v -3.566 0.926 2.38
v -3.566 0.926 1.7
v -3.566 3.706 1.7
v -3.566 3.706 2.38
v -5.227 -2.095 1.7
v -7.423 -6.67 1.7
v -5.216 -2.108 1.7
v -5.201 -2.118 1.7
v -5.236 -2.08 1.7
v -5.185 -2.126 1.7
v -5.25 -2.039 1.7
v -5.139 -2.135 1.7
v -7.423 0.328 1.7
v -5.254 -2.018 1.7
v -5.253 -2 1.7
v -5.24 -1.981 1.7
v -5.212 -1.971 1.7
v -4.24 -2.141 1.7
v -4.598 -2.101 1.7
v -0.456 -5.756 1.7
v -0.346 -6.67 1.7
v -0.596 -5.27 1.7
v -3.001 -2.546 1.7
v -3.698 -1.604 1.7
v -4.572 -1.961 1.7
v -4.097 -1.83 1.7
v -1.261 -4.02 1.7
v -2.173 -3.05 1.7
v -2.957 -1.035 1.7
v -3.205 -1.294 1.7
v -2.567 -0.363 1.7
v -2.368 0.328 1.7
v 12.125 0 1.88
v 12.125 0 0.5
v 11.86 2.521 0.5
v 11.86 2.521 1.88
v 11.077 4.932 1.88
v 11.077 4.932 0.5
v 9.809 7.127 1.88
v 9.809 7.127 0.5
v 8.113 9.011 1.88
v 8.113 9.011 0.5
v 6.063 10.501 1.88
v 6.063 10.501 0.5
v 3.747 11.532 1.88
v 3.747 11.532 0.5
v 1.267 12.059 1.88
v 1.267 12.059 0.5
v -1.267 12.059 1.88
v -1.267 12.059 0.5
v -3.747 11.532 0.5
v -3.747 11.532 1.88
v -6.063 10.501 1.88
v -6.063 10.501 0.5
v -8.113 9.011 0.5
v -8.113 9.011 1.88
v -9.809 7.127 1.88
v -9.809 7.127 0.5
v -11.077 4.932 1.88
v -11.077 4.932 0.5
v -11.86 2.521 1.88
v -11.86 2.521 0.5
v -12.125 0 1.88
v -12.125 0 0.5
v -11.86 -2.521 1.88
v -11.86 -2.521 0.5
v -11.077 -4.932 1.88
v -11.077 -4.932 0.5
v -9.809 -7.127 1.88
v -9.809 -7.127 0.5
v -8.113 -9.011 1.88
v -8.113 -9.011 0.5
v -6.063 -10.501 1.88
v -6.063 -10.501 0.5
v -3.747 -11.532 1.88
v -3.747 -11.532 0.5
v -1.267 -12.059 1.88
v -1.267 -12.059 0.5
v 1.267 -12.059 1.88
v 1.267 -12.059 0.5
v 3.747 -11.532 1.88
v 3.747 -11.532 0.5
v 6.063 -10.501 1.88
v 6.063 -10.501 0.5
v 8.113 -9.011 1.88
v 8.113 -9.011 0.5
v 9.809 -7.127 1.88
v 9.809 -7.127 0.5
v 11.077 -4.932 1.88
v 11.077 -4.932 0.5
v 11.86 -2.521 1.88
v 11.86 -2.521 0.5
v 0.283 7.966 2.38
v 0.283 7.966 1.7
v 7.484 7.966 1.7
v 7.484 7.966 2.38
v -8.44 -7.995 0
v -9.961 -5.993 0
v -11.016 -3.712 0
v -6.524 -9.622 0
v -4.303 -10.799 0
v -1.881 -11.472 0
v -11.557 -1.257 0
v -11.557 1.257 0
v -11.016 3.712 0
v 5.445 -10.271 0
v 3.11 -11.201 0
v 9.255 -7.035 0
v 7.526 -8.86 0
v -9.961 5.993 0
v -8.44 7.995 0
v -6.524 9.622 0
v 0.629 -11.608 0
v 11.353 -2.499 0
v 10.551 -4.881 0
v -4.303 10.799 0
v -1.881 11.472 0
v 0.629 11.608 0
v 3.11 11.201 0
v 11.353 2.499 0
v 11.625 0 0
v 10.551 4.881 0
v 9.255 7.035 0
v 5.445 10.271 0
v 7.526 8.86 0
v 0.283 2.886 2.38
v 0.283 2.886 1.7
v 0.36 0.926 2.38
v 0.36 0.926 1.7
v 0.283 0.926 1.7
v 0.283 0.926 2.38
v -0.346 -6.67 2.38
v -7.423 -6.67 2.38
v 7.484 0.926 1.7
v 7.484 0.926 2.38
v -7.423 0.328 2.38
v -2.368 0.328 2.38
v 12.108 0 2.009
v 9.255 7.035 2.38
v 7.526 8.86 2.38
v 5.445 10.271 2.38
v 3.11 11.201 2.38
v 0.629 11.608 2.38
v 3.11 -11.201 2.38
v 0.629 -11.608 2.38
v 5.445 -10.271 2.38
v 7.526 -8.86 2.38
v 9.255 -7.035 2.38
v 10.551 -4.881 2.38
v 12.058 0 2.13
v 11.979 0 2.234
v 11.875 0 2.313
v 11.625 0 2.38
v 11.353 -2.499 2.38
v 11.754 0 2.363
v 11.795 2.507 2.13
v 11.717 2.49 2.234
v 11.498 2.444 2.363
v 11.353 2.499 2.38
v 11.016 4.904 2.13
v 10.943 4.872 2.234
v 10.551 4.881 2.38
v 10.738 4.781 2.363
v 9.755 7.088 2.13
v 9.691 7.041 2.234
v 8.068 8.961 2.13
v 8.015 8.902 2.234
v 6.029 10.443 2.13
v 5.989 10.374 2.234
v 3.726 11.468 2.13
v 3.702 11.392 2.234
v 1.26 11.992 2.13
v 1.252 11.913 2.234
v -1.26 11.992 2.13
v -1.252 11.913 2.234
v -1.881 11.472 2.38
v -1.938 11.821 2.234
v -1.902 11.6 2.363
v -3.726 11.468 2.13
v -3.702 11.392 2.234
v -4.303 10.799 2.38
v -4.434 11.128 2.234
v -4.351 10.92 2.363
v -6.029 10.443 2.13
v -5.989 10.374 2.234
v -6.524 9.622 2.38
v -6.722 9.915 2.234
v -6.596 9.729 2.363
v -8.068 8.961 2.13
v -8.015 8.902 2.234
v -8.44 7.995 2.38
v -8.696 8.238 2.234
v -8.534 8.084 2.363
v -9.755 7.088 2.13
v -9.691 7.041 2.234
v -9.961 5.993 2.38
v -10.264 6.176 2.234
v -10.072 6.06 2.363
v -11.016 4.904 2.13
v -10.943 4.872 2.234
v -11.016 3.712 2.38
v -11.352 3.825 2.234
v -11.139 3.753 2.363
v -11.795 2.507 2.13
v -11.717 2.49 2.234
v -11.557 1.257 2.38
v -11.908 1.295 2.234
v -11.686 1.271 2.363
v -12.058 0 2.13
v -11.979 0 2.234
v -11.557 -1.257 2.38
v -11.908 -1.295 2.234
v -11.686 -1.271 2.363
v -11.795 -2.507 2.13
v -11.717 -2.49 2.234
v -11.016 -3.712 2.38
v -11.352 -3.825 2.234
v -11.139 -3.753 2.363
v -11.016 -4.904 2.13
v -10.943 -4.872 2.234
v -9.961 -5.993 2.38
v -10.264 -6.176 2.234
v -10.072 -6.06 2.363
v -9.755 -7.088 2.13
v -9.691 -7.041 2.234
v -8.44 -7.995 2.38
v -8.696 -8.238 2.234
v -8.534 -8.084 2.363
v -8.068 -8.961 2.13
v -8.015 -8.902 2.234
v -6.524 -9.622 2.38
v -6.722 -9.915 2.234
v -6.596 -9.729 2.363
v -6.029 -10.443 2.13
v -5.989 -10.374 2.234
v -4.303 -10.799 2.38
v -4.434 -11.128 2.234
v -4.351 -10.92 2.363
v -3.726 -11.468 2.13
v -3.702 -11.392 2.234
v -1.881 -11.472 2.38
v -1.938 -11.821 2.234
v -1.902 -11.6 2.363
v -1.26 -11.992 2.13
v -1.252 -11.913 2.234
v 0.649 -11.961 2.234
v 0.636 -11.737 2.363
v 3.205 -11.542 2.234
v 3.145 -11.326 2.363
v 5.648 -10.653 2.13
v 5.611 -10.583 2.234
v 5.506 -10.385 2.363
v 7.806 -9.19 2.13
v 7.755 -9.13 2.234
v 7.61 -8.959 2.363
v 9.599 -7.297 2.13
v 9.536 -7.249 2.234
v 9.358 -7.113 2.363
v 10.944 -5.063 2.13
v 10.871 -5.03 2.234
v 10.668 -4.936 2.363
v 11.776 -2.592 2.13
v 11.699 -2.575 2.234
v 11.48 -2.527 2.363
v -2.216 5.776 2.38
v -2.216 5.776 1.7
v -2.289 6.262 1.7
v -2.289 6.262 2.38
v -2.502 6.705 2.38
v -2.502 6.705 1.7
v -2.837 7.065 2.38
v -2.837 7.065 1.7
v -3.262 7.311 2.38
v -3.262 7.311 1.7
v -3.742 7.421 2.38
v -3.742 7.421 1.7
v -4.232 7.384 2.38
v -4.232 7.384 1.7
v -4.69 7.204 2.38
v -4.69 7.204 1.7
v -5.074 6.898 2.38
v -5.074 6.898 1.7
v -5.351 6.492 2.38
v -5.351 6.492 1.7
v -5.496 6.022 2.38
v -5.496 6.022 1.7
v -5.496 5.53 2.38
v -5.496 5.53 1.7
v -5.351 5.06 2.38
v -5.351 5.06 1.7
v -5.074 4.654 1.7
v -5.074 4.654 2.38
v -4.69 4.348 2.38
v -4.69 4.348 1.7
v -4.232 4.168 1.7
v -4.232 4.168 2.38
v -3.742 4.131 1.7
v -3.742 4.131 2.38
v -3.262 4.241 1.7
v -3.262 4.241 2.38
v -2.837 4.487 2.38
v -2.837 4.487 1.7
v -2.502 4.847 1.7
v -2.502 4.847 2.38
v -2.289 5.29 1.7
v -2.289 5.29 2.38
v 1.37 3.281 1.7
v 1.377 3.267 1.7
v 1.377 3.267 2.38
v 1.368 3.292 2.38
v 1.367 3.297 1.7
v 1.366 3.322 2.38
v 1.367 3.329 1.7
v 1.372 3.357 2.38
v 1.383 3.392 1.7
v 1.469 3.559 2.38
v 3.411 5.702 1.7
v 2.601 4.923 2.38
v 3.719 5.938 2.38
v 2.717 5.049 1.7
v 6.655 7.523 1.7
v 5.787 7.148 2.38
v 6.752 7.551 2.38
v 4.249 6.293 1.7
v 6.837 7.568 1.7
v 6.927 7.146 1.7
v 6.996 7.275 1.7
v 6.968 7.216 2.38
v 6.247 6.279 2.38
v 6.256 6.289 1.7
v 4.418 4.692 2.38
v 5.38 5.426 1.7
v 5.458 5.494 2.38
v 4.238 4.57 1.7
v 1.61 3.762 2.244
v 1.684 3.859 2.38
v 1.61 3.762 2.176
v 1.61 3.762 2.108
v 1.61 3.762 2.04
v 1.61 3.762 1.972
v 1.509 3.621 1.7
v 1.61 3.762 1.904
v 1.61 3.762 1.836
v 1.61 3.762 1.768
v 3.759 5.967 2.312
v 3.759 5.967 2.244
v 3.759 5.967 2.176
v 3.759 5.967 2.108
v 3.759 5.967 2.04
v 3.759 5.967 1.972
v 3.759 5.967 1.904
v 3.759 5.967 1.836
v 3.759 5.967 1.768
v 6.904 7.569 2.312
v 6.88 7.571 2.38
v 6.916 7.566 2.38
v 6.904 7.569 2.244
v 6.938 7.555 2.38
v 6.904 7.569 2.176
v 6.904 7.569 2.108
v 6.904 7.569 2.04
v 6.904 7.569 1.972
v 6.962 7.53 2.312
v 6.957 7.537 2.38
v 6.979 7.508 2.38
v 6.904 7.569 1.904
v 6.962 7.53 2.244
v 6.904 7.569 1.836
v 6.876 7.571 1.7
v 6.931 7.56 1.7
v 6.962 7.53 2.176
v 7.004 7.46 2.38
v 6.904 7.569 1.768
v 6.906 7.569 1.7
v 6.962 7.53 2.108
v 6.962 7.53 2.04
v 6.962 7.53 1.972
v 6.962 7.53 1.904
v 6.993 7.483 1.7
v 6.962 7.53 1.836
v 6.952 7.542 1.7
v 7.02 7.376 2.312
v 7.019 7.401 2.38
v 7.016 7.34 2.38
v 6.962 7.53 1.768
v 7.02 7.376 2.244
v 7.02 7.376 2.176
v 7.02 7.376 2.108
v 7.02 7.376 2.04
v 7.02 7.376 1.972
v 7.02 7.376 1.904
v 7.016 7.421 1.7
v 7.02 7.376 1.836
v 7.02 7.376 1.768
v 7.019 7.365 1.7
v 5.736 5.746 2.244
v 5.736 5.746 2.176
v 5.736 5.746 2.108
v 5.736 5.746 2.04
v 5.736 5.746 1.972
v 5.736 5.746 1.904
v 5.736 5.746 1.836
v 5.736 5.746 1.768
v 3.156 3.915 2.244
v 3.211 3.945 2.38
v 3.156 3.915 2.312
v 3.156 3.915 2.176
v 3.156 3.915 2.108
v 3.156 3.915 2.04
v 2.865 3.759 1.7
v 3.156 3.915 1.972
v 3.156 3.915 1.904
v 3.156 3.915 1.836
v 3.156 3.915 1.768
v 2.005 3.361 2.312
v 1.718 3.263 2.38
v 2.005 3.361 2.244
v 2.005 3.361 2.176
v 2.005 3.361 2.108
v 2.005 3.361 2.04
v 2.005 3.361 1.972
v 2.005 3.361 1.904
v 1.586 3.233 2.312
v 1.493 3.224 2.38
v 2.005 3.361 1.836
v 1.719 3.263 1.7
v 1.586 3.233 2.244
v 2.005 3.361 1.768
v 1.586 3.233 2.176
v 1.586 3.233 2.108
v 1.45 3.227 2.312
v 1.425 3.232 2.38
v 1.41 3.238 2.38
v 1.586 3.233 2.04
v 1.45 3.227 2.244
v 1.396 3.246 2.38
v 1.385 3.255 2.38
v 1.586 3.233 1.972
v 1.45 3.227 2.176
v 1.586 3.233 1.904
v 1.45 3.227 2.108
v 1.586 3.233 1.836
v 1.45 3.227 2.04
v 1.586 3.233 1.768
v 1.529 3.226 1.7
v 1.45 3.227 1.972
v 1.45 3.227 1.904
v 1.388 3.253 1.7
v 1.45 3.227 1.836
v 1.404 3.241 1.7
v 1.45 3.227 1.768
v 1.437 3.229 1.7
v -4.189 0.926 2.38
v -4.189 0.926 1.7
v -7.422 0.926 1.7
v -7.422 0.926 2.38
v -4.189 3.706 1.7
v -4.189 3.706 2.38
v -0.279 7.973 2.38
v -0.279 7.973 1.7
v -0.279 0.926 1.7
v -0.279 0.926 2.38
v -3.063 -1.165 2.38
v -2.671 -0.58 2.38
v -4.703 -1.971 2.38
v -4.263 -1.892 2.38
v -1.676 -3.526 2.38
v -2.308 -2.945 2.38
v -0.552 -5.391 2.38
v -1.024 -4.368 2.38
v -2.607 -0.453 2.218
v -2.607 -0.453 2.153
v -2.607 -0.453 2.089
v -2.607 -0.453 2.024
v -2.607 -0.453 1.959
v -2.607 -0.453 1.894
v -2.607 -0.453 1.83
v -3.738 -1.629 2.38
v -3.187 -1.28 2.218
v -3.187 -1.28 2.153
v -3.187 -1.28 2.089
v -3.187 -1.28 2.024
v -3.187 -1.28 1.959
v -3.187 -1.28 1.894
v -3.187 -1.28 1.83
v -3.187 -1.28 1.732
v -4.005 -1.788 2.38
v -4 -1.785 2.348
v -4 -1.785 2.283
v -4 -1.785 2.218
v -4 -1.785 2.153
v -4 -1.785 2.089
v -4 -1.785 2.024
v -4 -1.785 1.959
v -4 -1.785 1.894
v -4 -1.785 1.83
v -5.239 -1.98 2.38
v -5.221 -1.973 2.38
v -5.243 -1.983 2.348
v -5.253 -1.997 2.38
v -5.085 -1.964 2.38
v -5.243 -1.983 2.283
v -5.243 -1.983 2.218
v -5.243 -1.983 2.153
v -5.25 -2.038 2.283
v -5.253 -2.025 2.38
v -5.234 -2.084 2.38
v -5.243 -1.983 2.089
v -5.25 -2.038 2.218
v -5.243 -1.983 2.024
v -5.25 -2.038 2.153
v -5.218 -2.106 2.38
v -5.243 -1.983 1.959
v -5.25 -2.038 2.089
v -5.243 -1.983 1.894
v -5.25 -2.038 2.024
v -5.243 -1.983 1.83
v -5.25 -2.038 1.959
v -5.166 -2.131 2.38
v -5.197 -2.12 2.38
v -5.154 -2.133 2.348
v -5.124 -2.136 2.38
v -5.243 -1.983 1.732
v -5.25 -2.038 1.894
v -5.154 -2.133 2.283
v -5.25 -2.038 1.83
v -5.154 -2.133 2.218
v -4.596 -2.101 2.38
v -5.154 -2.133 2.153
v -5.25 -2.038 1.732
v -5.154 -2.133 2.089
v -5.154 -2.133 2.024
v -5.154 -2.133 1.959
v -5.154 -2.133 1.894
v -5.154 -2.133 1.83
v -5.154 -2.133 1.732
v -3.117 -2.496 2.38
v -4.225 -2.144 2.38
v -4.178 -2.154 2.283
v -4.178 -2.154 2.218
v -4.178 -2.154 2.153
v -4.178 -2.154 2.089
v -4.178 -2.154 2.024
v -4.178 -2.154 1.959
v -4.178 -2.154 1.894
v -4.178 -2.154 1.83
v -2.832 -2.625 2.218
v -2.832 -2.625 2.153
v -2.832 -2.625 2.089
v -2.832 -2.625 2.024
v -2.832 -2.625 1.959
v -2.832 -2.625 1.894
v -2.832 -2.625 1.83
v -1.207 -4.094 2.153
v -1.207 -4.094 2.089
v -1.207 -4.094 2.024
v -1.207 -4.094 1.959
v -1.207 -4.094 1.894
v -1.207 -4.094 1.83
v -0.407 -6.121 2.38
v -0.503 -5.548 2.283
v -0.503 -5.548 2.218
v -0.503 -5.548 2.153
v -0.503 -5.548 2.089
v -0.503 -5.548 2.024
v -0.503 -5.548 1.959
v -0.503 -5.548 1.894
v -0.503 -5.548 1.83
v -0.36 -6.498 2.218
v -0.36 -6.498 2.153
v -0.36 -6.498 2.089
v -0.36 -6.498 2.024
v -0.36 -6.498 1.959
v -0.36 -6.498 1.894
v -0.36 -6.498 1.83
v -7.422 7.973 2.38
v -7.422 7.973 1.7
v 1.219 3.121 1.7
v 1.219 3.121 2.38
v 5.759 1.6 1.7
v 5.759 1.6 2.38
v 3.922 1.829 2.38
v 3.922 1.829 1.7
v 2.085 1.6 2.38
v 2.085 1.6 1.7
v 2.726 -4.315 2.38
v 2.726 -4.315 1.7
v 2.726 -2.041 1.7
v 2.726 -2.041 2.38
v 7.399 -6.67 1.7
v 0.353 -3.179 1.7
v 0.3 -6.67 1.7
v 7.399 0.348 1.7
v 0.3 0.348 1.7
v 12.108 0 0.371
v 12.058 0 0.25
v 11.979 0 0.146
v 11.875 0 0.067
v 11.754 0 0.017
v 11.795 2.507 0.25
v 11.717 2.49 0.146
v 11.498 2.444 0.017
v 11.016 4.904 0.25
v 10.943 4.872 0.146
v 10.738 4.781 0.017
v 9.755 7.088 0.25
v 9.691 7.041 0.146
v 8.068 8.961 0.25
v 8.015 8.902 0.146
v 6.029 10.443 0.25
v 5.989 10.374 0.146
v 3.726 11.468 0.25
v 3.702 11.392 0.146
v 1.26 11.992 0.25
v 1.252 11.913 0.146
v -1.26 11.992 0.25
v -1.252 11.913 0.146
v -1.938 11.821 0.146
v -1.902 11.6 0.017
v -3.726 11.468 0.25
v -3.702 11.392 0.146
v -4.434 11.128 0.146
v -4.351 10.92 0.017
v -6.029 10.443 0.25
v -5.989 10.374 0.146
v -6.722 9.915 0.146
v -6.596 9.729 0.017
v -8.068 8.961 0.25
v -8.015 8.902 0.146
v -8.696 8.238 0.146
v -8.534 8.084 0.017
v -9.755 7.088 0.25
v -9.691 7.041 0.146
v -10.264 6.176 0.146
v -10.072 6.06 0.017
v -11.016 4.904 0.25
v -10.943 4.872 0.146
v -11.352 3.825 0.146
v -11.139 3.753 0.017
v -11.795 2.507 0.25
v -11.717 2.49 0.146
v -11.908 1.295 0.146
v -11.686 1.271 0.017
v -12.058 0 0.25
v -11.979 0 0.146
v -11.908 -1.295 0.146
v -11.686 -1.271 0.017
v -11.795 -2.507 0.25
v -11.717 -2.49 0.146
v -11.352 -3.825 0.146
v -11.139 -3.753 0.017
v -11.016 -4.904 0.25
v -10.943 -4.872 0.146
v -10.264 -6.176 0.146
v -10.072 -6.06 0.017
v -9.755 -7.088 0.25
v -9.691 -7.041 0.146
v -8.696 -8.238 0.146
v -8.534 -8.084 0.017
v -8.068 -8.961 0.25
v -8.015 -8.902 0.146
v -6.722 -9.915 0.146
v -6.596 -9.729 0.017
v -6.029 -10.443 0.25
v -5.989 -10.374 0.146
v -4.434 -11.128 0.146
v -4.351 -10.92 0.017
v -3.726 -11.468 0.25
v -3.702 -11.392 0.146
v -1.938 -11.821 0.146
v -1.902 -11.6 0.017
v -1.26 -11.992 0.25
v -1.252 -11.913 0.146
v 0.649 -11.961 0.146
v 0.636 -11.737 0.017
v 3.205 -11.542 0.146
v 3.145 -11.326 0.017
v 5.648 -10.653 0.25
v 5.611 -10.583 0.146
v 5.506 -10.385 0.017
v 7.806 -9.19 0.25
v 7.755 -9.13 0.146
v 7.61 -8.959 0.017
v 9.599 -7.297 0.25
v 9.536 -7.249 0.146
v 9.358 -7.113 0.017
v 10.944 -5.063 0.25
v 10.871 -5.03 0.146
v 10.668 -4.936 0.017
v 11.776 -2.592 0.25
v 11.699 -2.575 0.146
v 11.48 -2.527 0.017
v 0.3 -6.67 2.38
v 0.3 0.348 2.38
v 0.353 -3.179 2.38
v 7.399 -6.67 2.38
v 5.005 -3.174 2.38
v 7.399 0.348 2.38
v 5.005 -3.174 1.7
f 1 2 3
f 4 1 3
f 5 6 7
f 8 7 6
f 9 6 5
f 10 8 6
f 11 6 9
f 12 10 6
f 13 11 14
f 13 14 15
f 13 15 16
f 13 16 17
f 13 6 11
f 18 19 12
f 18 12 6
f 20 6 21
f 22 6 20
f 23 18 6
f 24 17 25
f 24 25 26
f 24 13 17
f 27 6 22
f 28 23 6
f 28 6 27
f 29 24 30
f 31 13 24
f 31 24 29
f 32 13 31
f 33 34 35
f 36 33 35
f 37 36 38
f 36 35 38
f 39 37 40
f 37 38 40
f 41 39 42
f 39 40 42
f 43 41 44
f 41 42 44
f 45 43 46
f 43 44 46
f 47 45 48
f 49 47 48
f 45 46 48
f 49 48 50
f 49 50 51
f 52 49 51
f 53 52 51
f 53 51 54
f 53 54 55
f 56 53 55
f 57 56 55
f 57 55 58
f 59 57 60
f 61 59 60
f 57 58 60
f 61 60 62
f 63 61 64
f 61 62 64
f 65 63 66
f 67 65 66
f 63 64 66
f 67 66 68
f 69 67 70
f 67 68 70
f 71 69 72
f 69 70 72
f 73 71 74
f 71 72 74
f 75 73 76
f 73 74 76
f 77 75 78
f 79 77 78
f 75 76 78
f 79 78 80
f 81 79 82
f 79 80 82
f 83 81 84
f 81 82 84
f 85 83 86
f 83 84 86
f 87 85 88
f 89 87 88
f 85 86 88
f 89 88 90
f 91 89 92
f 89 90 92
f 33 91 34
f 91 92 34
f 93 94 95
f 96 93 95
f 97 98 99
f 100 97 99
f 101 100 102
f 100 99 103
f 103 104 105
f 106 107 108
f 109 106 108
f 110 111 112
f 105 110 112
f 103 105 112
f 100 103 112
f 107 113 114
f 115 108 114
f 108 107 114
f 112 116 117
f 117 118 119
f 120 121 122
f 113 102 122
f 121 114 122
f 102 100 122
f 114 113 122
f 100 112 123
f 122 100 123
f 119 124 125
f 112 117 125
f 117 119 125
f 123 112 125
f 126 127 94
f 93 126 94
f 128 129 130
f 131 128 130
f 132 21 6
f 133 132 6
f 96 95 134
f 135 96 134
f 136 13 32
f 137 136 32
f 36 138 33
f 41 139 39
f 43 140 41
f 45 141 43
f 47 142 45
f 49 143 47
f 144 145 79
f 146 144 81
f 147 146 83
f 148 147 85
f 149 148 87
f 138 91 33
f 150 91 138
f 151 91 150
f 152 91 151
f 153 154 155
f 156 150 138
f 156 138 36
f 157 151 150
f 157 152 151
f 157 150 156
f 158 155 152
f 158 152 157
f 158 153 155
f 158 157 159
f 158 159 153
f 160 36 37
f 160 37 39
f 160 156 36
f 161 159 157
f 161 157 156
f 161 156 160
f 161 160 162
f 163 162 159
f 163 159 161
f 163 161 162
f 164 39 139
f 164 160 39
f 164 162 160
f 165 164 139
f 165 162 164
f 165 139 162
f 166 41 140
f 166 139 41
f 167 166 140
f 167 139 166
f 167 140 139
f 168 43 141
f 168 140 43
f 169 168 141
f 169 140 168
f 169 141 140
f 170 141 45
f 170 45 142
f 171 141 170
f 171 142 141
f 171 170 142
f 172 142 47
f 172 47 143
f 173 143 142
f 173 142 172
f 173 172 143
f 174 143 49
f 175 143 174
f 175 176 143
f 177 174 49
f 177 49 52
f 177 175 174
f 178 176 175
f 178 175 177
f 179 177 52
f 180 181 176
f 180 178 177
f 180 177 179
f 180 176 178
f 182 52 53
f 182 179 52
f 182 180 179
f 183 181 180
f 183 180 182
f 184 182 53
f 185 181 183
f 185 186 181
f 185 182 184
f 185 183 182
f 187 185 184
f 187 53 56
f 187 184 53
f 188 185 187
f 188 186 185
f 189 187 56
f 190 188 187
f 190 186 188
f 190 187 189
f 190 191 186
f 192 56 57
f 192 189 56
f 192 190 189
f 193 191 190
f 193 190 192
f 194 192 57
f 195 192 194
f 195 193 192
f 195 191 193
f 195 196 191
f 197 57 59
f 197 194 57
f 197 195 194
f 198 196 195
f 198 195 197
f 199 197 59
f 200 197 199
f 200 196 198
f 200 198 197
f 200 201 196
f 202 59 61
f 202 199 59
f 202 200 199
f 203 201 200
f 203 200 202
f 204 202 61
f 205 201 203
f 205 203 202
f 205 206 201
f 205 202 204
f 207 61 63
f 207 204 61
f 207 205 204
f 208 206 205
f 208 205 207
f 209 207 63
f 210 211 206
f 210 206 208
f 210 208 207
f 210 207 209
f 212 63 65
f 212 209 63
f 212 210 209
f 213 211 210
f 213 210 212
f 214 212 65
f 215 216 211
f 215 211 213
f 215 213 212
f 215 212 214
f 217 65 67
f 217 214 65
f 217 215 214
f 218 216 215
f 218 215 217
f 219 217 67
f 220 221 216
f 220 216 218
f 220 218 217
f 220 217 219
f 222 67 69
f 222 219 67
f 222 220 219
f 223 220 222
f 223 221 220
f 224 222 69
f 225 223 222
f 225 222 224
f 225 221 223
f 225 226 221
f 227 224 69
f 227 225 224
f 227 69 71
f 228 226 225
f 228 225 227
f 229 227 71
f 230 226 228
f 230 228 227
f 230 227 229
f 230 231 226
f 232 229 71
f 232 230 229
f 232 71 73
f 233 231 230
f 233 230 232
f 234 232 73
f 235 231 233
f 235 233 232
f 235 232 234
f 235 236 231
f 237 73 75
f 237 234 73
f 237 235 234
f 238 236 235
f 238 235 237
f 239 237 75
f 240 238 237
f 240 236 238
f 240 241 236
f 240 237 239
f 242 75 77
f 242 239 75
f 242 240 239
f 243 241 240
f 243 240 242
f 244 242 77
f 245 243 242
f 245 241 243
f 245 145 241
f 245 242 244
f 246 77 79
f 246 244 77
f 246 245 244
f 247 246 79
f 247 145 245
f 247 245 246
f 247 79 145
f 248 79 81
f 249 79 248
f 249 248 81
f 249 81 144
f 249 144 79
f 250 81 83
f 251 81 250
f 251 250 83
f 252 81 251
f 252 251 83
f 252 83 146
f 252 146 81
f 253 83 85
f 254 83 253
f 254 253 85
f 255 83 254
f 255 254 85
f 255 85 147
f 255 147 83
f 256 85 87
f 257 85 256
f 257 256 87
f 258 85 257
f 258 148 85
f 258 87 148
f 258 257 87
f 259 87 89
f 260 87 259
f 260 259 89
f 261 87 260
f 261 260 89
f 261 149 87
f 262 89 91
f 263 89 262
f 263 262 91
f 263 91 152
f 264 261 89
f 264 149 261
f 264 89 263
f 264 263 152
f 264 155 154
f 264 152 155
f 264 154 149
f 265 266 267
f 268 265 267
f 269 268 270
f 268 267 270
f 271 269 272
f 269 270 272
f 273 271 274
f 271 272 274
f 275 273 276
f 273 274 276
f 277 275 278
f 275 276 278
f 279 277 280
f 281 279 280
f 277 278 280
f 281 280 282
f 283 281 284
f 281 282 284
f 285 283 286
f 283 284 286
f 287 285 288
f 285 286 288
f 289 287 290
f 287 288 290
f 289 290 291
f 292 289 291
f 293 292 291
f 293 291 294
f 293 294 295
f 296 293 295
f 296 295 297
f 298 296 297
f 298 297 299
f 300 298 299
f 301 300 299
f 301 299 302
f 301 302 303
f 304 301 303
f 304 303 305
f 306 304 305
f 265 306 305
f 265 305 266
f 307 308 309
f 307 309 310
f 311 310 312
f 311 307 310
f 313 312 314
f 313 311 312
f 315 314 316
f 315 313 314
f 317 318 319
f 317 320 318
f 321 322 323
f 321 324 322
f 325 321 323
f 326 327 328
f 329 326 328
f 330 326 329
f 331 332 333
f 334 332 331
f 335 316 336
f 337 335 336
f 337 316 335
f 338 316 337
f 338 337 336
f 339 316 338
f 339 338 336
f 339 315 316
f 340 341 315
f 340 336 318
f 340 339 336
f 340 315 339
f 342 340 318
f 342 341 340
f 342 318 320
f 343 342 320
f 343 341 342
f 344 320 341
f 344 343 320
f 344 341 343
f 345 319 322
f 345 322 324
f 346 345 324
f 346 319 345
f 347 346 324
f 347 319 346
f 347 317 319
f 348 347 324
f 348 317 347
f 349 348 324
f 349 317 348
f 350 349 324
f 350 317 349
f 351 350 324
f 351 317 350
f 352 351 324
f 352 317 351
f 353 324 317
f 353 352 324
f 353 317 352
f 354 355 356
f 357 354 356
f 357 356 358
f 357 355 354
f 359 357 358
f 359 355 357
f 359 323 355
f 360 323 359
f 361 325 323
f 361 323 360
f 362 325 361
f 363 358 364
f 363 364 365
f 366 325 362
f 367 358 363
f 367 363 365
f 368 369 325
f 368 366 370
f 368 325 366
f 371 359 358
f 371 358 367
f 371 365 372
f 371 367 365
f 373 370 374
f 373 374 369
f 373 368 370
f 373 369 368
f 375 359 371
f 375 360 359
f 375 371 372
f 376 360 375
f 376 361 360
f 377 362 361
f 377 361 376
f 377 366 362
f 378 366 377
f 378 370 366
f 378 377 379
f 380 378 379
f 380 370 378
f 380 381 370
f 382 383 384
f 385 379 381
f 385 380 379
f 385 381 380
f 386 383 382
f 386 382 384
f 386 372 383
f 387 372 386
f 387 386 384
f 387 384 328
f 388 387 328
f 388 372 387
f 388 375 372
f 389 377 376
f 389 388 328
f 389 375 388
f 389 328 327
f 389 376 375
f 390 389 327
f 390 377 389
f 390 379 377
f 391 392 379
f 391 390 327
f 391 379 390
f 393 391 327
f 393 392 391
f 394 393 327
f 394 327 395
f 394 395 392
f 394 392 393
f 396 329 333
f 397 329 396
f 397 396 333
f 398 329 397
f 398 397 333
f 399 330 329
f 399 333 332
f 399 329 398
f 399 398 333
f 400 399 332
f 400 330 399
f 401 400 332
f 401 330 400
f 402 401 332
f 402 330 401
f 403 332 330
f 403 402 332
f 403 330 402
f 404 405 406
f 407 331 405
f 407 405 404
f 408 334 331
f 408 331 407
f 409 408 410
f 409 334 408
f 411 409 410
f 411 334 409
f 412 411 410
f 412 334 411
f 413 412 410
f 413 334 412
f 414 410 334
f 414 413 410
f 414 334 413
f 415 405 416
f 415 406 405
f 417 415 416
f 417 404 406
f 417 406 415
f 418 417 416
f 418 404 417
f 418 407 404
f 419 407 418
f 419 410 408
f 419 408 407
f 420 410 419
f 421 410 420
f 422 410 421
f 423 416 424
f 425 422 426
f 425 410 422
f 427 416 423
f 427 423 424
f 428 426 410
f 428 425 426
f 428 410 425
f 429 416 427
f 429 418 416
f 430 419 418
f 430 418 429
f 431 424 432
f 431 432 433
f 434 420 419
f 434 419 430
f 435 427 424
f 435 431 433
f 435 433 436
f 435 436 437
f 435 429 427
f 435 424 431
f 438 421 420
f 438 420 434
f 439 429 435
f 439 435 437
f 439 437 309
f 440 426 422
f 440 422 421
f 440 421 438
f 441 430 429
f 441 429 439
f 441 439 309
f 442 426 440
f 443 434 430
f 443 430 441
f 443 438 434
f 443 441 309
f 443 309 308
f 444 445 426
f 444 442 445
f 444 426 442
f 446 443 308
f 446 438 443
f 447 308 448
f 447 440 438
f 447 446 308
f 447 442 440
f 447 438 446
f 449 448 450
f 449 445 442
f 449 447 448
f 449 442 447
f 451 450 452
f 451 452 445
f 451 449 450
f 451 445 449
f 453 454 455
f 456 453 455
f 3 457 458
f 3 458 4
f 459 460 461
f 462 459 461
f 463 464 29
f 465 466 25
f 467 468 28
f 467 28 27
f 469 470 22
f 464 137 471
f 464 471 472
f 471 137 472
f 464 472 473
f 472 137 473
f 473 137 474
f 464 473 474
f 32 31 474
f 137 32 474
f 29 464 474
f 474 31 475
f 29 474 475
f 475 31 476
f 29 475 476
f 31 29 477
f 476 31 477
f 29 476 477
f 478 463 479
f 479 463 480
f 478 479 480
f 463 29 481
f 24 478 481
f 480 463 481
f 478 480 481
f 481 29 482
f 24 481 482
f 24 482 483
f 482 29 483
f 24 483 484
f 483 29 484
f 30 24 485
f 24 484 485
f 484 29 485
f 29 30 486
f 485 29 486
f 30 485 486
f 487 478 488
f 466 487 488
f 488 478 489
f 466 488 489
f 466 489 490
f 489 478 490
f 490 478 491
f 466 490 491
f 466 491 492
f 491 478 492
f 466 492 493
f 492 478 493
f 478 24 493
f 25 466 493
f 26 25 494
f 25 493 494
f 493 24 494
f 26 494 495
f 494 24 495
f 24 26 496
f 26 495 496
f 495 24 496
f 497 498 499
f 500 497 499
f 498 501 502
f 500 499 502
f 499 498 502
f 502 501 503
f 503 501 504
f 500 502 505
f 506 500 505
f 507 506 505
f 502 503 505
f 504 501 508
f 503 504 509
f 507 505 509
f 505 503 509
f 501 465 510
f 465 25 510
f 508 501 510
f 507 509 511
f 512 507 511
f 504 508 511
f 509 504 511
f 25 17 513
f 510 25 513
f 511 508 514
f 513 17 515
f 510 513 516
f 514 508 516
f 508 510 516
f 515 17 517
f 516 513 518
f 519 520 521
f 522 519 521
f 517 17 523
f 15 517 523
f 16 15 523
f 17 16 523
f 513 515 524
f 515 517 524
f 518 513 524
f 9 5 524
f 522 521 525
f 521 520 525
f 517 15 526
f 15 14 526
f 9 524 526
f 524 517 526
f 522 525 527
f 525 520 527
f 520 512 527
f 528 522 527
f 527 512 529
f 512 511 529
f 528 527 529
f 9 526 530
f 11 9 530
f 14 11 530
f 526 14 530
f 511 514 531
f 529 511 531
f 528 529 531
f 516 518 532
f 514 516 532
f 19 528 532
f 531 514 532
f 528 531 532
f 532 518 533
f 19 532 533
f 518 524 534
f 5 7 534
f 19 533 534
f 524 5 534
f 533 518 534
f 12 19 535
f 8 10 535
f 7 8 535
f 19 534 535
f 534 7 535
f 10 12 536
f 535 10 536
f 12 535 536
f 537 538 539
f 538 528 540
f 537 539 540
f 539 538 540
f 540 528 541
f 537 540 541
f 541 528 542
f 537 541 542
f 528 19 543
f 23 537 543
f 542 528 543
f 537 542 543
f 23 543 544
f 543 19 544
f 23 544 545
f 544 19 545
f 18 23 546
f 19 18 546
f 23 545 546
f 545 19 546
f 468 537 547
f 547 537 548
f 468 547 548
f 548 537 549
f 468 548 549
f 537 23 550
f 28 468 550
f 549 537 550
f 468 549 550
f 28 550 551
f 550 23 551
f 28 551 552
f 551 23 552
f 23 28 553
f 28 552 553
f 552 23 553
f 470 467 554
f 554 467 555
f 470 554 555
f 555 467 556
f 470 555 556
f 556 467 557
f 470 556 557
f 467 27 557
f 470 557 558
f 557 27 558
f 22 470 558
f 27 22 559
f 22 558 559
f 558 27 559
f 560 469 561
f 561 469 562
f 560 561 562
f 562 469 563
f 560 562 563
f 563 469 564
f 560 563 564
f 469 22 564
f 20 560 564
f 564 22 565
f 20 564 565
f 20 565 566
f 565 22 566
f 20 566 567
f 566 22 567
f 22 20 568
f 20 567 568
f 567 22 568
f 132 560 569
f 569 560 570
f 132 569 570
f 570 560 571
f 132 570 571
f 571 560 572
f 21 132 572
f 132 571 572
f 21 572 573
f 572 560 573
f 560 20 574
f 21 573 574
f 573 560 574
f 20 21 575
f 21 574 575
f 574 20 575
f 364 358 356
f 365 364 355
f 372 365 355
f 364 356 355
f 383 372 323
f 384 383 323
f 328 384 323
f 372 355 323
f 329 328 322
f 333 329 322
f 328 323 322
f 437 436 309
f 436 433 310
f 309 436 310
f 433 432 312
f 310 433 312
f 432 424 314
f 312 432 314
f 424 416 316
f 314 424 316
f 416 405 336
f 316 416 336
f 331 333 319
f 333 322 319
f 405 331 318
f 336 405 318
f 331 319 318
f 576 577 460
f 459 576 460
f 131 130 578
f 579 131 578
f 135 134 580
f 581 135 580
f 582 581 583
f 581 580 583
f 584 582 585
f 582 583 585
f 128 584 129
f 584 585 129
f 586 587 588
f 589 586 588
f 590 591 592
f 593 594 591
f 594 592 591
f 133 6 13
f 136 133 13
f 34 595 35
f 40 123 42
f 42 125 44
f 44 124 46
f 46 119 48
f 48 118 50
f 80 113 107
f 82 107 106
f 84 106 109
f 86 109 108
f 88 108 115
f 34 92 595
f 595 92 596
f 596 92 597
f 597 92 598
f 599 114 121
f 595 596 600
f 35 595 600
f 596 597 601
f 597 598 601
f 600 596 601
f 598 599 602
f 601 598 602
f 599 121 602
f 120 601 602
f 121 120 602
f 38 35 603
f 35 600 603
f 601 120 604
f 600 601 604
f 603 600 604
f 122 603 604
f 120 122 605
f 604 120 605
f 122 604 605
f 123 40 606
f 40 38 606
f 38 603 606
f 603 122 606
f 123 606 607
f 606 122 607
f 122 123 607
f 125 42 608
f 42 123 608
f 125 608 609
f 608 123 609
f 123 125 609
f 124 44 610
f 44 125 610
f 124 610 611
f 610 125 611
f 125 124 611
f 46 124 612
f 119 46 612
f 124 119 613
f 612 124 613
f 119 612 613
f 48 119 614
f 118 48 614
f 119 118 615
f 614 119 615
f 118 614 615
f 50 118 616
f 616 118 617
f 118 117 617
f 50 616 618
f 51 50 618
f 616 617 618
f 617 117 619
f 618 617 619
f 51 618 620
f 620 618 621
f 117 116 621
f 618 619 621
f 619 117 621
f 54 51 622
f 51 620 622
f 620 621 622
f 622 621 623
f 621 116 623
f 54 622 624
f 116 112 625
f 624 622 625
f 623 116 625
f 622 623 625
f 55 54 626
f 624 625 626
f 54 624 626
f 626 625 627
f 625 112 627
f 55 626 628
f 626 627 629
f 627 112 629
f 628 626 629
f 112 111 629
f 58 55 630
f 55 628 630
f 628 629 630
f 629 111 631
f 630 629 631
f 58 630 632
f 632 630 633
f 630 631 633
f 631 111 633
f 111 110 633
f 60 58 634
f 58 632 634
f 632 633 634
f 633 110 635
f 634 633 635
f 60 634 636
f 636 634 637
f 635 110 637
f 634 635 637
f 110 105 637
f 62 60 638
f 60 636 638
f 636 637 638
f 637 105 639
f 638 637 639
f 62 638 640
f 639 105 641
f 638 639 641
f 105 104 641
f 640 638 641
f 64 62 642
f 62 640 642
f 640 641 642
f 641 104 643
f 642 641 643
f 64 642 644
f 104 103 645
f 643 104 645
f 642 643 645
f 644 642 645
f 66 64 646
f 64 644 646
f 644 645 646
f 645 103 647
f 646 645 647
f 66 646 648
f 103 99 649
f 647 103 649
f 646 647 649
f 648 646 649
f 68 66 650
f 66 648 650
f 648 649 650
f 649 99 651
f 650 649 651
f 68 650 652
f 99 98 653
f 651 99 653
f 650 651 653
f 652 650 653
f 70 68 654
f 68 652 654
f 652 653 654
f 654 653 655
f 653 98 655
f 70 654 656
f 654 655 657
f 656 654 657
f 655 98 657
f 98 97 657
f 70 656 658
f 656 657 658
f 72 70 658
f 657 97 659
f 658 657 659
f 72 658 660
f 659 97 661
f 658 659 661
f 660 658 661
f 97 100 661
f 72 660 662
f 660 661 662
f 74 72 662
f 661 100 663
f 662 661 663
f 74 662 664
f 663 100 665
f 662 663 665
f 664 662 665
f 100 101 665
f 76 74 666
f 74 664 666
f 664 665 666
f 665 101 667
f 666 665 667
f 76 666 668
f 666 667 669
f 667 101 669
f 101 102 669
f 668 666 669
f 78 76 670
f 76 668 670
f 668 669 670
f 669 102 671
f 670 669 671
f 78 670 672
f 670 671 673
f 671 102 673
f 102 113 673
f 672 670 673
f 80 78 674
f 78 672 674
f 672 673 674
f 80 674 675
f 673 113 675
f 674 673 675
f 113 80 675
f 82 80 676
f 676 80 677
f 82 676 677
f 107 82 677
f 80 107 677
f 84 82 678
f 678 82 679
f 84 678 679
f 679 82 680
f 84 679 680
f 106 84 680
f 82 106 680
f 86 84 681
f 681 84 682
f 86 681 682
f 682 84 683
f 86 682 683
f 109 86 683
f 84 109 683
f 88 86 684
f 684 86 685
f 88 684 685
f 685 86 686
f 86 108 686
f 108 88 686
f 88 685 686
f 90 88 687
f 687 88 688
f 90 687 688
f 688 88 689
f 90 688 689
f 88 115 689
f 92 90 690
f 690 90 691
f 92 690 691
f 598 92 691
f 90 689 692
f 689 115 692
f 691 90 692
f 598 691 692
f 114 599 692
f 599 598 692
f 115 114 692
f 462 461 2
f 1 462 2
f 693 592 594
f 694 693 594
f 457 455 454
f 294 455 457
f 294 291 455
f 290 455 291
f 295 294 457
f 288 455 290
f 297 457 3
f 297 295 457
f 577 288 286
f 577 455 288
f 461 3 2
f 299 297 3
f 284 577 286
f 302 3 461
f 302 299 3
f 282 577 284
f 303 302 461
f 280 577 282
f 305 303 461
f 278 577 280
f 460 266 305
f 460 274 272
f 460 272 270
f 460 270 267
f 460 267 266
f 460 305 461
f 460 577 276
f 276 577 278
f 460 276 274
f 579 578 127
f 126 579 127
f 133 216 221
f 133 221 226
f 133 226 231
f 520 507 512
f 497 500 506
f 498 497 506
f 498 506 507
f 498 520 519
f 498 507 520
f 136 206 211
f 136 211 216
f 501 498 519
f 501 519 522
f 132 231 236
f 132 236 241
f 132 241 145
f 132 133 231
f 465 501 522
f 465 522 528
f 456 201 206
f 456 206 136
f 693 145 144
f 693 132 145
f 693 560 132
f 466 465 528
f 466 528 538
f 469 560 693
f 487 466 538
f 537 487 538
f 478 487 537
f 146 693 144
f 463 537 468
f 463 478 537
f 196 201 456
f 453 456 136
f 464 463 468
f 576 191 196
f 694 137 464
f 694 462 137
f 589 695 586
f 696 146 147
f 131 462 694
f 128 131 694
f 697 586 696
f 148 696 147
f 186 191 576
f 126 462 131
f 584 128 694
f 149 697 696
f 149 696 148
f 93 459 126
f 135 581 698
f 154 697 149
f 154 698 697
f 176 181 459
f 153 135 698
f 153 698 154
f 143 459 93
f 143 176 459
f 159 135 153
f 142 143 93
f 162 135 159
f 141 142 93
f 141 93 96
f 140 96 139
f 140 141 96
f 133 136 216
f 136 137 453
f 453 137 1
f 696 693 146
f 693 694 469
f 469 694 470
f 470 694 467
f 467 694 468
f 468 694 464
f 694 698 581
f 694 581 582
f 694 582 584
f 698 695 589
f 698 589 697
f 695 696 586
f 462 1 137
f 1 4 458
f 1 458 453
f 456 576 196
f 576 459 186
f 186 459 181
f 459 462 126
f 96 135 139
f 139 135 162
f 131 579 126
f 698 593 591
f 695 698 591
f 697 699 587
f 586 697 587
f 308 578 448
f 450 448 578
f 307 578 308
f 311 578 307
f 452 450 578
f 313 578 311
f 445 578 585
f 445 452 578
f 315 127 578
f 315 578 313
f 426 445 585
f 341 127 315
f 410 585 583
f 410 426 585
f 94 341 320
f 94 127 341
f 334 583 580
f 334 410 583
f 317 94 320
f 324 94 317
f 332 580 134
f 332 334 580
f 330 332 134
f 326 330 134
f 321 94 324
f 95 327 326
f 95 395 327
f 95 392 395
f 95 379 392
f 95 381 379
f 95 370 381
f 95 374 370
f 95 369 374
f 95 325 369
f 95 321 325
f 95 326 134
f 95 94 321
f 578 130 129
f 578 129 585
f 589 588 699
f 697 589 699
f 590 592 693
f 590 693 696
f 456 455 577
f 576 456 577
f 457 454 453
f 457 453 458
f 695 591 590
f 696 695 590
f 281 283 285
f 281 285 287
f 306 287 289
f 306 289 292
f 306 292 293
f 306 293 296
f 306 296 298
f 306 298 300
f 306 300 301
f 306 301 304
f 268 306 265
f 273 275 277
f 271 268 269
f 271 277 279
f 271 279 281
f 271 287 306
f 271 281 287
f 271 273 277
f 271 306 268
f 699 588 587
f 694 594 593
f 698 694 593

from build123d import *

# Parameters (mm, degrees)
F1_R      = 12.125
F1_W      = 7.0986367516
F1_H      = 7.0182182118
F2_DEPTH  = 2.38
F3_R      = 0.5
F4_R      = 0.5
F1_W_2    = 0.6225926336
F1_H_2    = 2.7800722164
F1_R_2    = 1.6491882735
F5_DEPTH  = 1.7
F6_DEPTH  = 2.38
F7_DEPTH  = 1.7
F8_DEPTH  = 2.38
F9_DEPTH  = 1.7
F10_DEPTH = 2.38
F11_DEPTH = 1.7
F12_DEPTH = 2.38


# Not quite as in the source:
# - a feature names something its author has since deleted; it is built from what else it names


with BuildPart() as f2:
    # F1 (on Top) → F2 (new body)
    with BuildSketch(Plane.XY):
        Circle(F1_R)
        Polygon((-7.4228290468, -6.6703339335), (-7.4228290468, 0.3279154543), (-2.3676725104, 0.3279154543), (-0.2785333199, 0.3279154543), (-0.2785333199, -6.6703339335), (-0.3460554872, -6.6703339335), align=None, mode=Mode.SUBTRACT)
        with Locations((3.8493661203, -3.1612248276)):
            Rectangle(F1_W, F1_H, mode=Mode.SUBTRACT)
        Polygon((-7.4221123941, 0.9262498352), (-7.4221123941, 7.9733738676), (-0.2785333199, 7.9733738676), (-0.2785333199, 0.9262498352), (-3.5664748866, 0.9262498352), (-4.1890675202, 0.9262498352), align=None, mode=Mode.SUBTRACT)
        Polygon((0.2827075659, 2.8855106793), (0.2827075659, 7.9663181677), (7.483521942, 7.9663181677), (7.483521942, 0.9262498352), (0.3603694204, 0.9262498352), (0.2827075659, 0.9262498352), align=None, mode=Mode.SUBTRACT)
    extrude(amount=F2_DEPTH)

    # F3
    f3_edges = [f2.edges().sort_by_distance(p)[0] for p in [
        (-12.125, 0, 2.38),
    ]]
    fillet(f3_edges, radius=F3_R)

    # F4
    f4_edges = [f2.edges().sort_by_distance(p)[0] for p in [
        (-12.125, 0, 0),
    ]]
    fillet(f4_edges, radius=F4_R)

    # F1 (on Top) → F5 (join)
    with BuildSketch(Plane.XY):
        with Locations((-3.8777712034, 2.3162859434)):
            Rectangle(F1_W_2, F1_H_2)
        Polygon((-0.2785333199, 7.9733738676), (-7.4221123941, 7.9733738676), (-7.4221123941, 0.9262498352), (-4.1890675202, 0.9262498352), (-4.1890675202, 3.7063220516), (-3.5664748866, 3.7063220516), (-3.5664748866, 0.9262498352), (-0.2785333199, 0.9262498352), align=None)
        with Locations((-3.8649578562, 5.7759984099)):
            Circle(F1_R_2, mode=Mode.SUBTRACT)
        with Locations((-3.8649578562, 5.7759984099)):
            Circle(F1_R_2)
    extrude(amount=F5_DEPTH)

    # F1 (on Top) → F6 (join, through all)
    with BuildSketch(Plane.XY):
        with Locations((-3.8649578562, 5.7759984099)):
            Circle(F1_R_2)
        with Locations((-3.8777712034, 2.3162859434)):
            Rectangle(F1_W_2, F1_H_2)
    extrude(amount=F6_DEPTH)

    # F1 (on Top) → F7 (join)
    with BuildSketch(Plane.XY):
        Polygon((7.3986844961, 0.3478842783), (0.3000477445, 0.3478842783), (0.3000477445, -6.6703339335), (7.3986844961, -6.6703339335), (0.3533055715, -3.1787578482), align=None)
        Polygon((7.3986844961, -6.6703339335), (7.3986844961, 0.3478842783), (0.3533055715, -3.1787578482), align=None)
        Polygon((2.7262428775, -4.3149543926), (2.7262428775, -2.0406346302), (5.0051301037, -3.174232257), align=None, mode=Mode.SUBTRACT)
        Polygon((5.0051301037, -3.174232257), (2.7262428775, -2.0406346302), (2.7262428775, -4.3149543926), align=None)
    extrude(amount=F7_DEPTH)

    # F1 (on Top) → F8 (join, through all)
    with BuildSketch(Plane.XY):
        Polygon((7.3986844961, -6.6703339335), (7.3986844961, 0.3478842783), (0.3533055715, -3.1787578482), align=None)
        Polygon((2.7262428775, -4.3149543926), (2.7262428775, -2.0406346302), (5.0051301037, -3.174232257), align=None, mode=Mode.SUBTRACT)
    extrude(amount=F8_DEPTH)

    # F1 (on Top) → F9 (join)
    with BuildSketch(Plane.XY):
        with BuildLine():
            Line((7.483521942, 7.9663181677), (0.2827075659, 7.9663181677))
            Line((0.2827075659, 7.9663181677), (0.2827075659, 2.8855106793))
            Line((0.2827075659, 2.8855106793), (1.2191495625, 3.121049609))
            Line((1.2191495625, 3.121049609), (0.2827075659, 0.9262498352))
            Line((0.2827075659, 0.9262498352), (0.3603694204, 0.9262498352))
            ThreePointArc((0.3603694204, 0.9262498352), (3.9219456812, 1.8291393853), (7.483521942, 0.9262498352))
            Line((7.483521942, 0.9262498352), (7.483521942, 7.9663181677))
        make_face()
        with BuildLine():
            add(Edge.make_bspline(
                [(1.3767119963, 3.2667766791), (1.2845749547, 3.4219093882), (2.4235264698, 4.7283232609), (3.5408753586, 5.9956475692), (6.2391393141, 7.418797197), (6.8917216898, 7.5995638626), (6.9665371868, 7.5324135615), (7.0858412946, 7.3423232683), (6.6731021166, 6.7922406039), (5.7276068284, 5.5974675028), (3.4869356373, 3.9709181084), (1.4800923213, 3.0927134618), (1.3767119963, 3.2667766791)],
                knots=[0, 0, 0, 0, 0.1118483914, 0.24448623, 0.4022164571, 0.4698846563, 0.4939539155, 0.5310056289, 0.6004556126, 0.7122838549, 0.8745029919, 1, 1, 1, 1], degree=3))
        make_face(mode=Mode.SUBTRACT)
        with BuildLine():
            add(Edge.make_bspline(
                [(1.3767119963, 3.2667766791), (1.2845749547, 3.4219093882), (2.4235264698, 4.7283232609), (3.5408753586, 5.9956475692), (6.2391393141, 7.418797197), (6.8917216898, 7.5995638626), (6.9665371868, 7.5324135615), (7.0858412946, 7.3423232683), (6.6731021166, 6.7922406039), (5.7276068284, 5.5974675028), (3.4869356373, 3.9709181084), (1.4800923213, 3.0927134618), (1.3767119963, 3.2667766791)],
                knots=[0, 0, 0, 0, 0.1118483914, 0.24448623, 0.4022164571, 0.4698846563, 0.4939539155, 0.5310056289, 0.6004556126, 0.7122838549, 0.8745029919, 1, 1, 1, 1], degree=3))
        make_face()
        with BuildLine():
            Line((0.3603694204, 0.9262498352), (7.483521942, 0.9262498352))
            ThreePointArc((7.483521942, 0.9262498352), (3.9219456812, 1.8291393853), (0.3603694204, 0.9262498352))
        make_face()
        Polygon((1.2191495625, 3.121049609), (0.2827075659, 2.8855106793), (0.2827075659, 0.9262498352), align=None)
    extrude(amount=F9_DEPTH)

    # F1 (on Top) → F10 (join, through all)
    with BuildSketch(Plane.XY):
        Polygon((1.2191495625, 3.121049609), (0.2827075659, 2.8855106793), (0.2827075659, 0.9262498352), align=None)
        with BuildLine():
            Line((0.3603694204, 0.9262498352), (7.483521942, 0.9262498352))
            ThreePointArc((7.483521942, 0.9262498352), (3.9219456812, 1.8291393853), (0.3603694204, 0.9262498352))
        make_face()
        with BuildLine():
            add(Edge.make_bspline(
                [(1.3767119963, 3.2667766791), (1.2845749547, 3.4219093882), (2.4235264698, 4.7283232609), (3.5408753586, 5.9956475692), (6.2391393141, 7.418797197), (6.8917216898, 7.5995638626), (6.9665371868, 7.5324135615), (7.0858412946, 7.3423232683), (6.6731021166, 6.7922406039), (5.7276068284, 5.5974675028), (3.4869356373, 3.9709181084), (1.4800923213, 3.0927134618), (1.3767119963, 3.2667766791)],
                knots=[0, 0, 0, 0, 0.1118483914, 0.24448623, 0.4022164571, 0.4698846563, 0.4939539155, 0.5310056289, 0.6004556126, 0.7122838549, 0.8745029919, 1, 1, 1, 1], degree=3))
        make_face()
    extrude(amount=F10_DEPTH)

    # F1 (on Top) → F11 (join)
    with BuildSketch(Plane.XY):
        with BuildLine():
            Line((-2.3676725104, 0.3279154543), (-7.4228290468, 0.3279154543))
            Line((-7.4228290468, 0.3279154543), (-7.4228290468, -6.6703339335))
            Line((-7.4228290468, -6.6703339335), (-0.3460554872, -6.6703339335))
            add(Edge.make_bspline(
                [(-2.3676725104, 0.3279154543), (-2.4010776229, 0.1925208975), (-2.4676626782, -0.0773555796), (-2.5876283556, -0.4592288495), (-2.8925989526, -0.9591658513), (-3.1522335022, -1.2984425332), (-3.7077309843, -1.5983279611), (-3.9910833592, -1.8042724956), (-4.6138242999, -2.0322850474), (-5.2750707973, -1.9267077545), (-5.2495717166, -2.0402242976), (-5.2345405936, -2.0988768979), (-5.1450714886, -2.160796158), (-4.6968573849, -2.0831274685), (-4.1628510391, -2.1198506981), (-2.7612179261, -2.5768069629), (-1.9266213932, -3.2203760963), (-1.1791410617, -4.0827112095), (-0.8290586767, -4.6976898082), (-0.4695580442, -5.5403229192), (-0.4210791981, -6.0329268408), (-0.3569856889, -6.488706617), (-0.3490962485, -6.6198055594), (-0.3460554872, -6.6703339335)],
                knots=[0, 0, 0, 0, 0.0435833884, 0.086873, 0.1381261489, 0.1834527151, 0.2360140714, 0.2766814959, 0.3332809415, 0.3847393962, 0.400679245, 0.417088421, 0.4369598891, 0.4804923093, 0.5317269995, 0.6128329106, 0.6846024733, 0.7554901569, 0.8138428178, 0.8776633918, 0.9266412888, 0.9717259625, 1, 1, 1, 1], degree=3))
        make_face()
        with BuildLine():
            Line((-0.2785333199, 0.3279154543), (-2.3676725104, 0.3279154543))
            add(Edge.make_bspline(
                [(-2.3676725104, 0.3279154543), (-2.4010776229, 0.1925208975), (-2.4676626782, -0.0773555796), (-2.5876283556, -0.4592288495), (-2.8925989526, -0.9591658513), (-3.1522335022, -1.2984425332), (-3.7077309843, -1.5983279611), (-3.9910833592, -1.8042724956), (-4.6138242999, -2.0322850474), (-5.2750707973, -1.9267077545), (-5.2495717166, -2.0402242976), (-5.2345405936, -2.0988768979), (-5.1450714886, -2.160796158), (-4.6968573849, -2.0831274685), (-4.1628510391, -2.1198506981), (-2.7612179261, -2.5768069629), (-1.9266213932, -3.2203760963), (-1.1791410617, -4.0827112095), (-0.8290586767, -4.6976898082), (-0.4695580442, -5.5403229192), (-0.4210791981, -6.0329268408), (-0.3569856889, -6.488706617), (-0.3490962485, -6.6198055594), (-0.3460554872, -6.6703339335)],
                knots=[0, 0, 0, 0, 0.0435833884, 0.086873, 0.1381261489, 0.1834527151, 0.2360140714, 0.2766814959, 0.3332809415, 0.3847393962, 0.400679245, 0.417088421, 0.4369598891, 0.4804923093, 0.5317269995, 0.6128329106, 0.6846024733, 0.7554901569, 0.8138428178, 0.8776633918, 0.9266412888, 0.9717259625, 1, 1, 1, 1], degree=3))
            Line((-0.3460554872, -6.6703339335), (-0.2785333199, -6.6703339335))
            Line((-0.2785333199, -6.6703339335), (-0.2785333199, 0.3279154543))
        make_face()
    extrude(amount=F11_DEPTH)

    # F1 (on Top) → F12 (join, through all)
    with BuildSketch(Plane.XY):
        with BuildLine():
            Line((-0.2785333199, 0.3279154543), (-2.3676725104, 0.3279154543))
            add(Edge.make_bspline(
                [(-2.3676725104, 0.3279154543), (-2.4010776229, 0.1925208975), (-2.4676626782, -0.0773555796), (-2.5876283556, -0.4592288495), (-2.8925989526, -0.9591658513), (-3.1522335022, -1.2984425332), (-3.7077309843, -1.5983279611), (-3.9910833592, -1.8042724956), (-4.6138242999, -2.0322850474), (-5.2750707973, -1.9267077545), (-5.2495717166, -2.0402242976), (-5.2345405936, -2.0988768979), (-5.1450714886, -2.160796158), (-4.6968573849, -2.0831274685), (-4.1628510391, -2.1198506981), (-2.7612179261, -2.5768069629), (-1.9266213932, -3.2203760963), (-1.1791410617, -4.0827112095), (-0.8290586767, -4.6976898082), (-0.4695580442, -5.5403229192), (-0.4210791981, -6.0329268408), (-0.3569856889, -6.488706617), (-0.3490962485, -6.6198055594), (-0.3460554872, -6.6703339335)],
                knots=[0, 0, 0, 0, 0.0435833884, 0.086873, 0.1381261489, 0.1834527151, 0.2360140714, 0.2766814959, 0.3332809415, 0.3847393962, 0.400679245, 0.417088421, 0.4369598891, 0.4804923093, 0.5317269995, 0.6128329106, 0.6846024733, 0.7554901569, 0.8138428178, 0.8776633918, 0.9266412888, 0.9717259625, 1, 1, 1, 1], degree=3))
            Line((-0.3460554872, -6.6703339335), (-0.2785333199, -6.6703339335))
            Line((-0.2785333199, -6.6703339335), (-0.2785333199, 0.3279154543))
        make_face()
    extrude(amount=F12_DEPTH)


solid = f2.part
